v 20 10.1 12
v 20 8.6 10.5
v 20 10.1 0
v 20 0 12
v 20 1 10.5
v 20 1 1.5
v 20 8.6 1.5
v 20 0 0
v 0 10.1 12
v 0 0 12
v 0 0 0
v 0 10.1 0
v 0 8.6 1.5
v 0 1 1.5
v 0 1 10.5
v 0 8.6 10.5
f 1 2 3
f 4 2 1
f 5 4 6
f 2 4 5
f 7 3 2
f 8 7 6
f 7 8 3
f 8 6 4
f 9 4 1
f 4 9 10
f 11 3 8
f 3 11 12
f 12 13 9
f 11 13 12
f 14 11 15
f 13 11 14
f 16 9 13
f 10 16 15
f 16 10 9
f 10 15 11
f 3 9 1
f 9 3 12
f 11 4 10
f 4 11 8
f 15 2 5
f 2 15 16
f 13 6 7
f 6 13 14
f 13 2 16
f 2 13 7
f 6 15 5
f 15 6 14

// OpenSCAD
tolerance = 0.2;
innerWidth = 7.2+2*tolerance;
innerHeight = 8.6+2*tolerance;
length = 20;
innerWall = 1;
outerWall = 1.5;

difference() {
    cube([length, innerWidth+innerWall+outerWall, innerHeight+outerWall*2]);
    translate([-1,innerWall,outerWall]) cube([length+2, innerWidth, innerHeight]);   
}
